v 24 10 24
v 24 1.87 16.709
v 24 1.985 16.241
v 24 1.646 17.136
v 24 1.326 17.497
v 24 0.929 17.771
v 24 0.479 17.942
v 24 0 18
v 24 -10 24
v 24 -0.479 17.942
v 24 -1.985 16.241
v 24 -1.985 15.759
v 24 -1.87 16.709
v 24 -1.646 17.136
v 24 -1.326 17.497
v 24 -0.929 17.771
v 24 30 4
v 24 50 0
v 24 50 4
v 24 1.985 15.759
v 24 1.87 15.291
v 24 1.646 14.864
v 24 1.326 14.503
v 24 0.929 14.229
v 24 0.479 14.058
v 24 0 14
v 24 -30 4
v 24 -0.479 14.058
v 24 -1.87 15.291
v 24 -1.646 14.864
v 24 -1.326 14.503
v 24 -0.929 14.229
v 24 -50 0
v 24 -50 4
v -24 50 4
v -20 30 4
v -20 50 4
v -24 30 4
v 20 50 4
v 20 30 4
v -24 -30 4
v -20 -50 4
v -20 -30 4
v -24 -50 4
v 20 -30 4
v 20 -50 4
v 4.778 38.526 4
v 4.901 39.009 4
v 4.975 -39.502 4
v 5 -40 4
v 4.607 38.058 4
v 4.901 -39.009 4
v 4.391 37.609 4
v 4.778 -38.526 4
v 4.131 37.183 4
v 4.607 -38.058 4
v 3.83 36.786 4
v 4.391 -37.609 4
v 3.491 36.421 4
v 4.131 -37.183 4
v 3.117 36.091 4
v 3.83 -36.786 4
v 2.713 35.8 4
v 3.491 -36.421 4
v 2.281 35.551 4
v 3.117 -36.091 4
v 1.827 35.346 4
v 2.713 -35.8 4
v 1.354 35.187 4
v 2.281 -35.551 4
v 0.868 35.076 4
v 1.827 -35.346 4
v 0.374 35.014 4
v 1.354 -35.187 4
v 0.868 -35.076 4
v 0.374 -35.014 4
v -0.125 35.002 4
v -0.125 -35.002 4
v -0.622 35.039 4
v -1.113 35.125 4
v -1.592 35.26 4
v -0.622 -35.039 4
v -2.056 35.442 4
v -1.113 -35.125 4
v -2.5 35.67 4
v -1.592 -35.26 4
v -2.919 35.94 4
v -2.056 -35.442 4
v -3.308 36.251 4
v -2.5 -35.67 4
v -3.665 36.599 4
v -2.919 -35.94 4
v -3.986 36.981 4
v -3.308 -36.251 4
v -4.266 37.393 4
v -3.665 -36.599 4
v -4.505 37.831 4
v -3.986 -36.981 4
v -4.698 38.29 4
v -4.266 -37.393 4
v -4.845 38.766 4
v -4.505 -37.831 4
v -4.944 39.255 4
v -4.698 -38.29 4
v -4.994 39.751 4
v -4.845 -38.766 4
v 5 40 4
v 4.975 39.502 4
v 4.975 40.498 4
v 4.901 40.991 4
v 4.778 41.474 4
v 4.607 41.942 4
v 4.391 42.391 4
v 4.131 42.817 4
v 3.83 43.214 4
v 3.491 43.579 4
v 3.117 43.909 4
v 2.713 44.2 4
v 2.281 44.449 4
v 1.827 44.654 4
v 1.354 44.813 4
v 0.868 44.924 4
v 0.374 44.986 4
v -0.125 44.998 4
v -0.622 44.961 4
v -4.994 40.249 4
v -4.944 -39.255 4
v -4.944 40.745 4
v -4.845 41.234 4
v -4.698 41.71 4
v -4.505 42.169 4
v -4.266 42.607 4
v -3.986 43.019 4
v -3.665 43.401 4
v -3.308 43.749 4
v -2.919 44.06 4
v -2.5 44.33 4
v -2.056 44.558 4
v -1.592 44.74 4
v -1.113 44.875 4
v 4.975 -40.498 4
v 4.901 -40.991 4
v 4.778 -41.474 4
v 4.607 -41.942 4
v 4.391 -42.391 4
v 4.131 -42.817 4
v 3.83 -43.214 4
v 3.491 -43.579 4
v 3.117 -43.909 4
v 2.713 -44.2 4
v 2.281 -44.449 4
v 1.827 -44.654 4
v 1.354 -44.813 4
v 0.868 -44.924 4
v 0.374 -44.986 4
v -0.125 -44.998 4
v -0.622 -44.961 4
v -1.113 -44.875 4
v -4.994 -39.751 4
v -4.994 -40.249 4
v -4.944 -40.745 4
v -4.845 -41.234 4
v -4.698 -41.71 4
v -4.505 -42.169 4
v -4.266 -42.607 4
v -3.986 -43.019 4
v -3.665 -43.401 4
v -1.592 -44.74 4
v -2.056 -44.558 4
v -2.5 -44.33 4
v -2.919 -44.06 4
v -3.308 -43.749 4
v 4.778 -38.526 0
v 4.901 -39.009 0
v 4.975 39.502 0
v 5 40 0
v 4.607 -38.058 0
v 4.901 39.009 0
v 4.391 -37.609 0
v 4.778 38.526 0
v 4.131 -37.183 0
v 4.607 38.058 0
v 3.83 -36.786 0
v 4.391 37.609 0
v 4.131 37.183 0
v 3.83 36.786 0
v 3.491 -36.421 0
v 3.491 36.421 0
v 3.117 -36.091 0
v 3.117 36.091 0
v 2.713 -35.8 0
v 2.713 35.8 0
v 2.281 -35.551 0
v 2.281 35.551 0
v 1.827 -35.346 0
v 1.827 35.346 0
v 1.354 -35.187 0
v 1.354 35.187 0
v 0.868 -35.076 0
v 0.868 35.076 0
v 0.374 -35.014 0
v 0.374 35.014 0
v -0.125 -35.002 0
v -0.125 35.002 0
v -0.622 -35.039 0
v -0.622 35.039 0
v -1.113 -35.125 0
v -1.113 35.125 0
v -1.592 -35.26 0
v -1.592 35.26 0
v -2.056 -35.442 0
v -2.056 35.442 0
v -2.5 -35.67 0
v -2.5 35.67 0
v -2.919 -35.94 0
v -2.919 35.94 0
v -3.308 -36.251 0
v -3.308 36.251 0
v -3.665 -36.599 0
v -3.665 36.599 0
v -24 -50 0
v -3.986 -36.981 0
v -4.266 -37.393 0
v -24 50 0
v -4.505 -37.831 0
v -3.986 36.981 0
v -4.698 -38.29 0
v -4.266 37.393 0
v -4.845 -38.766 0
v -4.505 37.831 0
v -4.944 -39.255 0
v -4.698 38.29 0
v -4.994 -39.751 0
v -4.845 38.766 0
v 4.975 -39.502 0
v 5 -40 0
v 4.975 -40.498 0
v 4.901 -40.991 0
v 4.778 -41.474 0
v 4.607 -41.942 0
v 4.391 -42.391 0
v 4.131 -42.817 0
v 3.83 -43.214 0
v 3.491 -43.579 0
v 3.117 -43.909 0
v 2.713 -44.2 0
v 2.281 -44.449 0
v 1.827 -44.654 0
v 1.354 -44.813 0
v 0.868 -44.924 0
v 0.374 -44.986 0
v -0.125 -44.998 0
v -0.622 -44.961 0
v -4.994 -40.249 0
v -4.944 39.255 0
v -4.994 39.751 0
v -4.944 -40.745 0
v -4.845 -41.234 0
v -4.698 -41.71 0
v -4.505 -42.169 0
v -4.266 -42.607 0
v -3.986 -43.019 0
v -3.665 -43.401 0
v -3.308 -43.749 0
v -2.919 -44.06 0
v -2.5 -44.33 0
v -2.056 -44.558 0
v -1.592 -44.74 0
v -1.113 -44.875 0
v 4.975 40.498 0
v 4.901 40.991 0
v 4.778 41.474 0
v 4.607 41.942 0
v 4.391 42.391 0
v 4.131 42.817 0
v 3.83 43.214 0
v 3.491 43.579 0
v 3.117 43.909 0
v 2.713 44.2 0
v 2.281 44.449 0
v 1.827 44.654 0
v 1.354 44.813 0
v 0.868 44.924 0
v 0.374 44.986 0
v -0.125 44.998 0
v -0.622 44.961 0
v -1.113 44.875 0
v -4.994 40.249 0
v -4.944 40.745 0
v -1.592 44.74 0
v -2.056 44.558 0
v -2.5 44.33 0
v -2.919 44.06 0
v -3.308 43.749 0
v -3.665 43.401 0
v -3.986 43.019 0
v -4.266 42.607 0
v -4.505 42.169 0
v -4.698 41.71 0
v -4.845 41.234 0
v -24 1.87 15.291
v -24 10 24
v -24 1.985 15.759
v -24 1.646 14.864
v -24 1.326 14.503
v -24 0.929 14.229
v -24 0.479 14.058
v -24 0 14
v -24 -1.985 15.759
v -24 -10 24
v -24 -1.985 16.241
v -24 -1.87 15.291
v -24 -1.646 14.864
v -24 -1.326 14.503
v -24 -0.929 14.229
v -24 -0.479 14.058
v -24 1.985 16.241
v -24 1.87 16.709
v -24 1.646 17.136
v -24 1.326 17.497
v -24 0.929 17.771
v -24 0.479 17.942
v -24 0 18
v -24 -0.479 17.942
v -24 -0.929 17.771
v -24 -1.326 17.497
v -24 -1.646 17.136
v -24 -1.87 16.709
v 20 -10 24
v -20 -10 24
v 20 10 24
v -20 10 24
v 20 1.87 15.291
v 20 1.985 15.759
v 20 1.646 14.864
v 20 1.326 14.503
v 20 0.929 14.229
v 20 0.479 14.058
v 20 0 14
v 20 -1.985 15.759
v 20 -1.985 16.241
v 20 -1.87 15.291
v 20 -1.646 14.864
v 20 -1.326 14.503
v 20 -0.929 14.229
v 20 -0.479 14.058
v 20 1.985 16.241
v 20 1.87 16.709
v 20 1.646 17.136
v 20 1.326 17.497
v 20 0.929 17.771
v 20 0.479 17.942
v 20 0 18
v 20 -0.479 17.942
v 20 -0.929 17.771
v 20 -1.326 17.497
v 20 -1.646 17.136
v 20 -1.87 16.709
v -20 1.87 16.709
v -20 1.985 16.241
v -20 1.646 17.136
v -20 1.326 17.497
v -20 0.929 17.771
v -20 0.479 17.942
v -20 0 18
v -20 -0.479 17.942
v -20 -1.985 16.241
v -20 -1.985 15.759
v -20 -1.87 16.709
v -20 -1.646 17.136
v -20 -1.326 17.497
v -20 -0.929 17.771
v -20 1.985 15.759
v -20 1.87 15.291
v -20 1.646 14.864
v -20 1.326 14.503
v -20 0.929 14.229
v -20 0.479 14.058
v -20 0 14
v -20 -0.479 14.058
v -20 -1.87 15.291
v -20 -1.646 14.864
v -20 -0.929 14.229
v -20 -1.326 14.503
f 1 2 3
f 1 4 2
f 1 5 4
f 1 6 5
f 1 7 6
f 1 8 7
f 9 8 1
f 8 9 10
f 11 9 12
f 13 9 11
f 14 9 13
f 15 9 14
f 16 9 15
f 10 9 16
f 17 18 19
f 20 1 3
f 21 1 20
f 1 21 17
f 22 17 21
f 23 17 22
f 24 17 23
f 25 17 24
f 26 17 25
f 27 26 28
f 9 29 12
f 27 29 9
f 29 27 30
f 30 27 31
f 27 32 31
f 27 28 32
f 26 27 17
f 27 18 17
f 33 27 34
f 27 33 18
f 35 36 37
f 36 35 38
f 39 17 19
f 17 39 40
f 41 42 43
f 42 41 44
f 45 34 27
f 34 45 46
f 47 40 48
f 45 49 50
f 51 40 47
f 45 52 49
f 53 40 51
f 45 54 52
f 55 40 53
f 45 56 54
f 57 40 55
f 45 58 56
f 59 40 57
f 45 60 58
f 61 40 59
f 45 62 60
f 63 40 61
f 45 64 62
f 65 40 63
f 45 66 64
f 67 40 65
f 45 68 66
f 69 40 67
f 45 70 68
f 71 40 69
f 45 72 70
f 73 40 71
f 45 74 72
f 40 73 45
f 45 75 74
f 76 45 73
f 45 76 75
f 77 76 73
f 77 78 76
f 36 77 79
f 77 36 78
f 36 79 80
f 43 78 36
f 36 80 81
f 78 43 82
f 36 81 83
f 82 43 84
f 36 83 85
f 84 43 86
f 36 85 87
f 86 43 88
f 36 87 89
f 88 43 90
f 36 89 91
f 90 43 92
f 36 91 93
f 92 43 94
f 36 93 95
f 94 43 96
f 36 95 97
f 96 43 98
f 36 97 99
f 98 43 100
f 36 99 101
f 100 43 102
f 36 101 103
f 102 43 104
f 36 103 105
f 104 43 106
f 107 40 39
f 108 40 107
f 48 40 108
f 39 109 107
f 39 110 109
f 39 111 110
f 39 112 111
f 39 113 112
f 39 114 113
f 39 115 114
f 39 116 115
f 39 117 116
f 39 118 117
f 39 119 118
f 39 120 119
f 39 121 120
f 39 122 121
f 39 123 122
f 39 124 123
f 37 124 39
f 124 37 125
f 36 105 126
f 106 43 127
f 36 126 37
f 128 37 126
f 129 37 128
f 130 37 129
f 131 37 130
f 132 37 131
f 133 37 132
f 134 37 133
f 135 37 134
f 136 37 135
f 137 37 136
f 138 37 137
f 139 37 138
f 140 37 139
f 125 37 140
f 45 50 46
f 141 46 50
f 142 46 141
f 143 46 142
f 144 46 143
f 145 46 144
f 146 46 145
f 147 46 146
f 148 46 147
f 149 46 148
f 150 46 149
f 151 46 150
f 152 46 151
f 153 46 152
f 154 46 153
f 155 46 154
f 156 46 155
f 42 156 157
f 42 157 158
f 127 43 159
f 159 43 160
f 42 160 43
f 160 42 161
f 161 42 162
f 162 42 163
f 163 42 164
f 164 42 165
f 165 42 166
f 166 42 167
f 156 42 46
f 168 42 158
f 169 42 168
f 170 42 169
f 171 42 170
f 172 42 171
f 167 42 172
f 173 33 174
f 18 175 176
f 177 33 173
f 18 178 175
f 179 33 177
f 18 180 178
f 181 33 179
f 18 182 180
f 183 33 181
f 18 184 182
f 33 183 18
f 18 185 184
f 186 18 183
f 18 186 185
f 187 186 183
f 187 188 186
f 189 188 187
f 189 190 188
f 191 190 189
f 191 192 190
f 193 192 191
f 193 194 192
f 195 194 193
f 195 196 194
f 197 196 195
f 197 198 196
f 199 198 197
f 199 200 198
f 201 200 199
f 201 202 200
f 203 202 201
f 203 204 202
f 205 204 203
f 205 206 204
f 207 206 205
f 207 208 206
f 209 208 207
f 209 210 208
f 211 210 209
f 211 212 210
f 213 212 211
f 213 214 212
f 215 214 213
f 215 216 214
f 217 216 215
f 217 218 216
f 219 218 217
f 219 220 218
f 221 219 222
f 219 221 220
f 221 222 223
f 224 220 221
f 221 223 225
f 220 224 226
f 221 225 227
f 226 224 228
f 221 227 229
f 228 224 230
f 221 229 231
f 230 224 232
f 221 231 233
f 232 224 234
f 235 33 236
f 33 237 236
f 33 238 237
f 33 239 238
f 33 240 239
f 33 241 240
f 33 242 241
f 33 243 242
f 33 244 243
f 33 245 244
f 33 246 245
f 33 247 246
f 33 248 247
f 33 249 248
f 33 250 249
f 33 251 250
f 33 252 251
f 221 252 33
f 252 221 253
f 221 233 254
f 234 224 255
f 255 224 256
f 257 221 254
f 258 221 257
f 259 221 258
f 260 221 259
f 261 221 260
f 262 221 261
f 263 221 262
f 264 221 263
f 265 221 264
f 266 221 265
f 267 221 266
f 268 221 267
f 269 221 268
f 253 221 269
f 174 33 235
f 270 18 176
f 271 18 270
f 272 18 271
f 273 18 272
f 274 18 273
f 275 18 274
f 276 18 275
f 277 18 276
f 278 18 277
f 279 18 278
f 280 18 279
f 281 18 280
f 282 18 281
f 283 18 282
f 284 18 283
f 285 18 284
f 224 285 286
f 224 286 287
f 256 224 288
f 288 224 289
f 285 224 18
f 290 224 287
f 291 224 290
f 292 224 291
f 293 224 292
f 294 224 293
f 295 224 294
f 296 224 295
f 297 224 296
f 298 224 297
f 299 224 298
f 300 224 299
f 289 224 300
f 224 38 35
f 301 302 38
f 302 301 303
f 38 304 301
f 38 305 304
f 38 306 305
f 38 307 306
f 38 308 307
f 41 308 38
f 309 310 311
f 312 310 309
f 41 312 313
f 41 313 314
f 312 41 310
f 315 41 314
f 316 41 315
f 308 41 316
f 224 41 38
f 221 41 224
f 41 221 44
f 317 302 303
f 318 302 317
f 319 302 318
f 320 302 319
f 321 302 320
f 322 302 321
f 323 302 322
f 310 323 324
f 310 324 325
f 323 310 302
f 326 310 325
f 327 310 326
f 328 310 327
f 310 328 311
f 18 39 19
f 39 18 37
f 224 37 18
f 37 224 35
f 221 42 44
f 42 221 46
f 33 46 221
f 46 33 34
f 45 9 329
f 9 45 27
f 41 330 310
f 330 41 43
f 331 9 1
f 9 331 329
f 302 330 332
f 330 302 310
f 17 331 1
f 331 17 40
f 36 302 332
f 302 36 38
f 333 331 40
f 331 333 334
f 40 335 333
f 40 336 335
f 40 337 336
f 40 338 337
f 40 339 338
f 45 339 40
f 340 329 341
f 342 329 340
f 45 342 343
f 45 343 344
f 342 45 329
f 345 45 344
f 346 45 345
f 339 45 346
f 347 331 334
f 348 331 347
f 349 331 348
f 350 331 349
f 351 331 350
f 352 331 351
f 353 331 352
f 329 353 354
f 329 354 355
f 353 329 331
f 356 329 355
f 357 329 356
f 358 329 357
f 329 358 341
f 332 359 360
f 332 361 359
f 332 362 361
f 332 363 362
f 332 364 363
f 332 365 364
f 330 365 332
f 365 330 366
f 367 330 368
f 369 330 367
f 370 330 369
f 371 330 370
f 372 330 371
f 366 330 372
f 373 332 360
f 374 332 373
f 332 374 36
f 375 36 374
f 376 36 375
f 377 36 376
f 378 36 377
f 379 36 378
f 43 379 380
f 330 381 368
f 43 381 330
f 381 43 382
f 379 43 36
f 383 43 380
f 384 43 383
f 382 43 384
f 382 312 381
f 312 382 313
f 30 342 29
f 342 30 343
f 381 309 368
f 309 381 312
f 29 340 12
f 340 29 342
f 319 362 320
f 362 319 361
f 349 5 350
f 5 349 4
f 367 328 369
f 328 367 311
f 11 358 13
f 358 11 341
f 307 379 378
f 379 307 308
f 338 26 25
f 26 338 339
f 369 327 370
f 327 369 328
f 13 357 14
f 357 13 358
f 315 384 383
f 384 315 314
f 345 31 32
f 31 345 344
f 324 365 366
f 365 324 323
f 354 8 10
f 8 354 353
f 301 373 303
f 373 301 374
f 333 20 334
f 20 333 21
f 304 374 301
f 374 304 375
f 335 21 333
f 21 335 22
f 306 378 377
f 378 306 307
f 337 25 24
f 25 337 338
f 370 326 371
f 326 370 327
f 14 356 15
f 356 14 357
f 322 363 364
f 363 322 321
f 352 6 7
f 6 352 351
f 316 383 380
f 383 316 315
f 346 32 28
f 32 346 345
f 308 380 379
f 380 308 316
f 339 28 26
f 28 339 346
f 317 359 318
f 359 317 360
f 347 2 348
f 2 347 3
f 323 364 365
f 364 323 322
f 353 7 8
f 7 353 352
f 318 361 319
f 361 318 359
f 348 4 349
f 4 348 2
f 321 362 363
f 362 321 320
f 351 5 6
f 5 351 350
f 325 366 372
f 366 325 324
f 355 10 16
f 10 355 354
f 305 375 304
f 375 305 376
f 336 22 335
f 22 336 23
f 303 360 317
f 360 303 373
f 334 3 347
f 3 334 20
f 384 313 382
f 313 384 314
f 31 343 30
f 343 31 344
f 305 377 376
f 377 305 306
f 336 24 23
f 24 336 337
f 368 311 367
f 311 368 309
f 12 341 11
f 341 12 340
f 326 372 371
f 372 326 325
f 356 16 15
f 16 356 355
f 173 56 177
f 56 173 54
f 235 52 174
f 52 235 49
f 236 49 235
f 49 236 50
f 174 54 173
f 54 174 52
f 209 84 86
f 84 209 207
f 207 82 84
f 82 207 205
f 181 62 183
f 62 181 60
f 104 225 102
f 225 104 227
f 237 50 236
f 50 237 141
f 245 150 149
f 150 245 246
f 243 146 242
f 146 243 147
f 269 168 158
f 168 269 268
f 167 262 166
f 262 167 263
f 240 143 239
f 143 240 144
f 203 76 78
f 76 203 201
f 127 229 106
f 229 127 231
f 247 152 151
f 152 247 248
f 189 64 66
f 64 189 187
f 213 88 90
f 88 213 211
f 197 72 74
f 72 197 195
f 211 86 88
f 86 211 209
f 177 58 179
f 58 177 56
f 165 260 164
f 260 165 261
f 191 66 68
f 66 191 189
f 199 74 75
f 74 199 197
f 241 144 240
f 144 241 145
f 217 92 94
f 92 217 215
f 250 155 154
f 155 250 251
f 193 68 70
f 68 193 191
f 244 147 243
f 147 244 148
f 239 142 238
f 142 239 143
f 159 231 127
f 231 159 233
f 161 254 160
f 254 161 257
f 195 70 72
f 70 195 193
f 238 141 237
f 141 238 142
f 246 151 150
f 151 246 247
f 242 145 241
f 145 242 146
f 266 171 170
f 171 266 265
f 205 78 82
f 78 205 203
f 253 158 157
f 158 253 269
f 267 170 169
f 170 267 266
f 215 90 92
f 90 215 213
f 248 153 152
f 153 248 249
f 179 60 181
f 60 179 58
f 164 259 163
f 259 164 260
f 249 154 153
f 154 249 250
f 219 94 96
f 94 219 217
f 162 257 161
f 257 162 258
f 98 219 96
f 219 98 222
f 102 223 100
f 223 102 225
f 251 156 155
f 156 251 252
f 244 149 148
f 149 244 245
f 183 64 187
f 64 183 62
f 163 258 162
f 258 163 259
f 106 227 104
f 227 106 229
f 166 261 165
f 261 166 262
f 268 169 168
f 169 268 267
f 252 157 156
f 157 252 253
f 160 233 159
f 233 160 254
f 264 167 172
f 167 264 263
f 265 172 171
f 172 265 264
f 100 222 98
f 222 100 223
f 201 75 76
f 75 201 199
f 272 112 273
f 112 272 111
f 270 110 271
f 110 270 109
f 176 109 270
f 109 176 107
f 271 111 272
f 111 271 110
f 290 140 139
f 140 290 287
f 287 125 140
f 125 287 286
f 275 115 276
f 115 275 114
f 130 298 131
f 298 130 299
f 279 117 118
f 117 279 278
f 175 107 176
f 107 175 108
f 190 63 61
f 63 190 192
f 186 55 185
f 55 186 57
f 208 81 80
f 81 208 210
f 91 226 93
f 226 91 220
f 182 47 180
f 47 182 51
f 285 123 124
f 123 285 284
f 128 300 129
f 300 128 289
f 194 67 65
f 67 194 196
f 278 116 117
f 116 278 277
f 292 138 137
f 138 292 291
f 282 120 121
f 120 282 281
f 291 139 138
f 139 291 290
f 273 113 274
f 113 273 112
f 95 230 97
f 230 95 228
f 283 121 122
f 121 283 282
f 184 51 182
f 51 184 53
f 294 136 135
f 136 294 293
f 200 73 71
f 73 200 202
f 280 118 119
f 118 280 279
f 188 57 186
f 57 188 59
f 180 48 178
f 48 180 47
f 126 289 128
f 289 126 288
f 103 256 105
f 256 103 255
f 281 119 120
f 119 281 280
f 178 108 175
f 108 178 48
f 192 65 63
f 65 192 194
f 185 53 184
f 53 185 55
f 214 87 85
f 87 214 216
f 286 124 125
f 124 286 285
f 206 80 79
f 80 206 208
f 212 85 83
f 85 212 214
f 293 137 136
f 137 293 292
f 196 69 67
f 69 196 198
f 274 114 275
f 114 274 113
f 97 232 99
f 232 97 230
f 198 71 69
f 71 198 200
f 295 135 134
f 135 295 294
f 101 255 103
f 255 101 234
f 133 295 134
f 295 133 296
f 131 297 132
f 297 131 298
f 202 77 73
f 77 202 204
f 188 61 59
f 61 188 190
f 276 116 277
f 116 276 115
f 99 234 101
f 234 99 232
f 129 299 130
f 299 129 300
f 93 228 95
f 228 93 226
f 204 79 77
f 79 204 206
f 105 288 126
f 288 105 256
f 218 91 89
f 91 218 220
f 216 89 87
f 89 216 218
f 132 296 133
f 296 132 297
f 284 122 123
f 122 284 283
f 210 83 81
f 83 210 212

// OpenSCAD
use <../../config.scad>

resolution = 4; $fs=$fs/resolution; $fa=$fa/resolution;

lg_ext =40;
l_ext=40;

lg_int =32;
l_int=32;
h=14;


module support_cam(){
    lg_vis =29;
    l_vis=29;
    difference(){

        union(){
            difference(){
                translate([-lg_ext/2, -l_ext/2]) cube([lg_ext,l_ext+10,h]);
                translate([-l_int/2, -l_int/2, 2]) cube([l_int,l_int,h]);

                
            }
            for(i=[-1,1]){
                for(j=[-1,1]){
                    translate([i*lg_vis/2, j*lg_vis/2]) cylinder(r=2, h);
                }
            }
        }
        for(i=[-1,1]){
            for(j=[-1,1]){
                translate([i*lg_vis/2, j*lg_vis/2, -1]) cylinder(r=1.5, h+3);
            }
        }
        
        translate([0, l_ext/2+5, h/2]) rotate([0,90,0]) cylinder(r=2, 100, center = true);
        
        translate([0, 0,-1]) cylinder(r=9, 100, center = true);
    }
}

module support_cam2(){
    lg2 = lg_ext+8;
    e = 4;
    l=100;
    difference(){
        union(){
            translate([-lg2/2, -l/2]) cube([lg2,l,e]);
            hull(){
                translate([-lg2/2, -30]) cube([lg2,60,e]);
                translate([-lg2/2, -10]) cube([lg2,20,e+20]);
            }
        }
        translate([-lg_ext/2, -l/2, e]) cube([lg_ext,l,100]);
        
        translate([0, 0, 16]) rotate([0,90,0]) cylinder(r=2, 100, center = true);
        
        translate([0, -40, 0]) cylinder(r=5, 100, center = true);
        translate([0, 40, 0]) cylinder(r=5, 100, center = true);
        
            
    }
}

support_cam2();
